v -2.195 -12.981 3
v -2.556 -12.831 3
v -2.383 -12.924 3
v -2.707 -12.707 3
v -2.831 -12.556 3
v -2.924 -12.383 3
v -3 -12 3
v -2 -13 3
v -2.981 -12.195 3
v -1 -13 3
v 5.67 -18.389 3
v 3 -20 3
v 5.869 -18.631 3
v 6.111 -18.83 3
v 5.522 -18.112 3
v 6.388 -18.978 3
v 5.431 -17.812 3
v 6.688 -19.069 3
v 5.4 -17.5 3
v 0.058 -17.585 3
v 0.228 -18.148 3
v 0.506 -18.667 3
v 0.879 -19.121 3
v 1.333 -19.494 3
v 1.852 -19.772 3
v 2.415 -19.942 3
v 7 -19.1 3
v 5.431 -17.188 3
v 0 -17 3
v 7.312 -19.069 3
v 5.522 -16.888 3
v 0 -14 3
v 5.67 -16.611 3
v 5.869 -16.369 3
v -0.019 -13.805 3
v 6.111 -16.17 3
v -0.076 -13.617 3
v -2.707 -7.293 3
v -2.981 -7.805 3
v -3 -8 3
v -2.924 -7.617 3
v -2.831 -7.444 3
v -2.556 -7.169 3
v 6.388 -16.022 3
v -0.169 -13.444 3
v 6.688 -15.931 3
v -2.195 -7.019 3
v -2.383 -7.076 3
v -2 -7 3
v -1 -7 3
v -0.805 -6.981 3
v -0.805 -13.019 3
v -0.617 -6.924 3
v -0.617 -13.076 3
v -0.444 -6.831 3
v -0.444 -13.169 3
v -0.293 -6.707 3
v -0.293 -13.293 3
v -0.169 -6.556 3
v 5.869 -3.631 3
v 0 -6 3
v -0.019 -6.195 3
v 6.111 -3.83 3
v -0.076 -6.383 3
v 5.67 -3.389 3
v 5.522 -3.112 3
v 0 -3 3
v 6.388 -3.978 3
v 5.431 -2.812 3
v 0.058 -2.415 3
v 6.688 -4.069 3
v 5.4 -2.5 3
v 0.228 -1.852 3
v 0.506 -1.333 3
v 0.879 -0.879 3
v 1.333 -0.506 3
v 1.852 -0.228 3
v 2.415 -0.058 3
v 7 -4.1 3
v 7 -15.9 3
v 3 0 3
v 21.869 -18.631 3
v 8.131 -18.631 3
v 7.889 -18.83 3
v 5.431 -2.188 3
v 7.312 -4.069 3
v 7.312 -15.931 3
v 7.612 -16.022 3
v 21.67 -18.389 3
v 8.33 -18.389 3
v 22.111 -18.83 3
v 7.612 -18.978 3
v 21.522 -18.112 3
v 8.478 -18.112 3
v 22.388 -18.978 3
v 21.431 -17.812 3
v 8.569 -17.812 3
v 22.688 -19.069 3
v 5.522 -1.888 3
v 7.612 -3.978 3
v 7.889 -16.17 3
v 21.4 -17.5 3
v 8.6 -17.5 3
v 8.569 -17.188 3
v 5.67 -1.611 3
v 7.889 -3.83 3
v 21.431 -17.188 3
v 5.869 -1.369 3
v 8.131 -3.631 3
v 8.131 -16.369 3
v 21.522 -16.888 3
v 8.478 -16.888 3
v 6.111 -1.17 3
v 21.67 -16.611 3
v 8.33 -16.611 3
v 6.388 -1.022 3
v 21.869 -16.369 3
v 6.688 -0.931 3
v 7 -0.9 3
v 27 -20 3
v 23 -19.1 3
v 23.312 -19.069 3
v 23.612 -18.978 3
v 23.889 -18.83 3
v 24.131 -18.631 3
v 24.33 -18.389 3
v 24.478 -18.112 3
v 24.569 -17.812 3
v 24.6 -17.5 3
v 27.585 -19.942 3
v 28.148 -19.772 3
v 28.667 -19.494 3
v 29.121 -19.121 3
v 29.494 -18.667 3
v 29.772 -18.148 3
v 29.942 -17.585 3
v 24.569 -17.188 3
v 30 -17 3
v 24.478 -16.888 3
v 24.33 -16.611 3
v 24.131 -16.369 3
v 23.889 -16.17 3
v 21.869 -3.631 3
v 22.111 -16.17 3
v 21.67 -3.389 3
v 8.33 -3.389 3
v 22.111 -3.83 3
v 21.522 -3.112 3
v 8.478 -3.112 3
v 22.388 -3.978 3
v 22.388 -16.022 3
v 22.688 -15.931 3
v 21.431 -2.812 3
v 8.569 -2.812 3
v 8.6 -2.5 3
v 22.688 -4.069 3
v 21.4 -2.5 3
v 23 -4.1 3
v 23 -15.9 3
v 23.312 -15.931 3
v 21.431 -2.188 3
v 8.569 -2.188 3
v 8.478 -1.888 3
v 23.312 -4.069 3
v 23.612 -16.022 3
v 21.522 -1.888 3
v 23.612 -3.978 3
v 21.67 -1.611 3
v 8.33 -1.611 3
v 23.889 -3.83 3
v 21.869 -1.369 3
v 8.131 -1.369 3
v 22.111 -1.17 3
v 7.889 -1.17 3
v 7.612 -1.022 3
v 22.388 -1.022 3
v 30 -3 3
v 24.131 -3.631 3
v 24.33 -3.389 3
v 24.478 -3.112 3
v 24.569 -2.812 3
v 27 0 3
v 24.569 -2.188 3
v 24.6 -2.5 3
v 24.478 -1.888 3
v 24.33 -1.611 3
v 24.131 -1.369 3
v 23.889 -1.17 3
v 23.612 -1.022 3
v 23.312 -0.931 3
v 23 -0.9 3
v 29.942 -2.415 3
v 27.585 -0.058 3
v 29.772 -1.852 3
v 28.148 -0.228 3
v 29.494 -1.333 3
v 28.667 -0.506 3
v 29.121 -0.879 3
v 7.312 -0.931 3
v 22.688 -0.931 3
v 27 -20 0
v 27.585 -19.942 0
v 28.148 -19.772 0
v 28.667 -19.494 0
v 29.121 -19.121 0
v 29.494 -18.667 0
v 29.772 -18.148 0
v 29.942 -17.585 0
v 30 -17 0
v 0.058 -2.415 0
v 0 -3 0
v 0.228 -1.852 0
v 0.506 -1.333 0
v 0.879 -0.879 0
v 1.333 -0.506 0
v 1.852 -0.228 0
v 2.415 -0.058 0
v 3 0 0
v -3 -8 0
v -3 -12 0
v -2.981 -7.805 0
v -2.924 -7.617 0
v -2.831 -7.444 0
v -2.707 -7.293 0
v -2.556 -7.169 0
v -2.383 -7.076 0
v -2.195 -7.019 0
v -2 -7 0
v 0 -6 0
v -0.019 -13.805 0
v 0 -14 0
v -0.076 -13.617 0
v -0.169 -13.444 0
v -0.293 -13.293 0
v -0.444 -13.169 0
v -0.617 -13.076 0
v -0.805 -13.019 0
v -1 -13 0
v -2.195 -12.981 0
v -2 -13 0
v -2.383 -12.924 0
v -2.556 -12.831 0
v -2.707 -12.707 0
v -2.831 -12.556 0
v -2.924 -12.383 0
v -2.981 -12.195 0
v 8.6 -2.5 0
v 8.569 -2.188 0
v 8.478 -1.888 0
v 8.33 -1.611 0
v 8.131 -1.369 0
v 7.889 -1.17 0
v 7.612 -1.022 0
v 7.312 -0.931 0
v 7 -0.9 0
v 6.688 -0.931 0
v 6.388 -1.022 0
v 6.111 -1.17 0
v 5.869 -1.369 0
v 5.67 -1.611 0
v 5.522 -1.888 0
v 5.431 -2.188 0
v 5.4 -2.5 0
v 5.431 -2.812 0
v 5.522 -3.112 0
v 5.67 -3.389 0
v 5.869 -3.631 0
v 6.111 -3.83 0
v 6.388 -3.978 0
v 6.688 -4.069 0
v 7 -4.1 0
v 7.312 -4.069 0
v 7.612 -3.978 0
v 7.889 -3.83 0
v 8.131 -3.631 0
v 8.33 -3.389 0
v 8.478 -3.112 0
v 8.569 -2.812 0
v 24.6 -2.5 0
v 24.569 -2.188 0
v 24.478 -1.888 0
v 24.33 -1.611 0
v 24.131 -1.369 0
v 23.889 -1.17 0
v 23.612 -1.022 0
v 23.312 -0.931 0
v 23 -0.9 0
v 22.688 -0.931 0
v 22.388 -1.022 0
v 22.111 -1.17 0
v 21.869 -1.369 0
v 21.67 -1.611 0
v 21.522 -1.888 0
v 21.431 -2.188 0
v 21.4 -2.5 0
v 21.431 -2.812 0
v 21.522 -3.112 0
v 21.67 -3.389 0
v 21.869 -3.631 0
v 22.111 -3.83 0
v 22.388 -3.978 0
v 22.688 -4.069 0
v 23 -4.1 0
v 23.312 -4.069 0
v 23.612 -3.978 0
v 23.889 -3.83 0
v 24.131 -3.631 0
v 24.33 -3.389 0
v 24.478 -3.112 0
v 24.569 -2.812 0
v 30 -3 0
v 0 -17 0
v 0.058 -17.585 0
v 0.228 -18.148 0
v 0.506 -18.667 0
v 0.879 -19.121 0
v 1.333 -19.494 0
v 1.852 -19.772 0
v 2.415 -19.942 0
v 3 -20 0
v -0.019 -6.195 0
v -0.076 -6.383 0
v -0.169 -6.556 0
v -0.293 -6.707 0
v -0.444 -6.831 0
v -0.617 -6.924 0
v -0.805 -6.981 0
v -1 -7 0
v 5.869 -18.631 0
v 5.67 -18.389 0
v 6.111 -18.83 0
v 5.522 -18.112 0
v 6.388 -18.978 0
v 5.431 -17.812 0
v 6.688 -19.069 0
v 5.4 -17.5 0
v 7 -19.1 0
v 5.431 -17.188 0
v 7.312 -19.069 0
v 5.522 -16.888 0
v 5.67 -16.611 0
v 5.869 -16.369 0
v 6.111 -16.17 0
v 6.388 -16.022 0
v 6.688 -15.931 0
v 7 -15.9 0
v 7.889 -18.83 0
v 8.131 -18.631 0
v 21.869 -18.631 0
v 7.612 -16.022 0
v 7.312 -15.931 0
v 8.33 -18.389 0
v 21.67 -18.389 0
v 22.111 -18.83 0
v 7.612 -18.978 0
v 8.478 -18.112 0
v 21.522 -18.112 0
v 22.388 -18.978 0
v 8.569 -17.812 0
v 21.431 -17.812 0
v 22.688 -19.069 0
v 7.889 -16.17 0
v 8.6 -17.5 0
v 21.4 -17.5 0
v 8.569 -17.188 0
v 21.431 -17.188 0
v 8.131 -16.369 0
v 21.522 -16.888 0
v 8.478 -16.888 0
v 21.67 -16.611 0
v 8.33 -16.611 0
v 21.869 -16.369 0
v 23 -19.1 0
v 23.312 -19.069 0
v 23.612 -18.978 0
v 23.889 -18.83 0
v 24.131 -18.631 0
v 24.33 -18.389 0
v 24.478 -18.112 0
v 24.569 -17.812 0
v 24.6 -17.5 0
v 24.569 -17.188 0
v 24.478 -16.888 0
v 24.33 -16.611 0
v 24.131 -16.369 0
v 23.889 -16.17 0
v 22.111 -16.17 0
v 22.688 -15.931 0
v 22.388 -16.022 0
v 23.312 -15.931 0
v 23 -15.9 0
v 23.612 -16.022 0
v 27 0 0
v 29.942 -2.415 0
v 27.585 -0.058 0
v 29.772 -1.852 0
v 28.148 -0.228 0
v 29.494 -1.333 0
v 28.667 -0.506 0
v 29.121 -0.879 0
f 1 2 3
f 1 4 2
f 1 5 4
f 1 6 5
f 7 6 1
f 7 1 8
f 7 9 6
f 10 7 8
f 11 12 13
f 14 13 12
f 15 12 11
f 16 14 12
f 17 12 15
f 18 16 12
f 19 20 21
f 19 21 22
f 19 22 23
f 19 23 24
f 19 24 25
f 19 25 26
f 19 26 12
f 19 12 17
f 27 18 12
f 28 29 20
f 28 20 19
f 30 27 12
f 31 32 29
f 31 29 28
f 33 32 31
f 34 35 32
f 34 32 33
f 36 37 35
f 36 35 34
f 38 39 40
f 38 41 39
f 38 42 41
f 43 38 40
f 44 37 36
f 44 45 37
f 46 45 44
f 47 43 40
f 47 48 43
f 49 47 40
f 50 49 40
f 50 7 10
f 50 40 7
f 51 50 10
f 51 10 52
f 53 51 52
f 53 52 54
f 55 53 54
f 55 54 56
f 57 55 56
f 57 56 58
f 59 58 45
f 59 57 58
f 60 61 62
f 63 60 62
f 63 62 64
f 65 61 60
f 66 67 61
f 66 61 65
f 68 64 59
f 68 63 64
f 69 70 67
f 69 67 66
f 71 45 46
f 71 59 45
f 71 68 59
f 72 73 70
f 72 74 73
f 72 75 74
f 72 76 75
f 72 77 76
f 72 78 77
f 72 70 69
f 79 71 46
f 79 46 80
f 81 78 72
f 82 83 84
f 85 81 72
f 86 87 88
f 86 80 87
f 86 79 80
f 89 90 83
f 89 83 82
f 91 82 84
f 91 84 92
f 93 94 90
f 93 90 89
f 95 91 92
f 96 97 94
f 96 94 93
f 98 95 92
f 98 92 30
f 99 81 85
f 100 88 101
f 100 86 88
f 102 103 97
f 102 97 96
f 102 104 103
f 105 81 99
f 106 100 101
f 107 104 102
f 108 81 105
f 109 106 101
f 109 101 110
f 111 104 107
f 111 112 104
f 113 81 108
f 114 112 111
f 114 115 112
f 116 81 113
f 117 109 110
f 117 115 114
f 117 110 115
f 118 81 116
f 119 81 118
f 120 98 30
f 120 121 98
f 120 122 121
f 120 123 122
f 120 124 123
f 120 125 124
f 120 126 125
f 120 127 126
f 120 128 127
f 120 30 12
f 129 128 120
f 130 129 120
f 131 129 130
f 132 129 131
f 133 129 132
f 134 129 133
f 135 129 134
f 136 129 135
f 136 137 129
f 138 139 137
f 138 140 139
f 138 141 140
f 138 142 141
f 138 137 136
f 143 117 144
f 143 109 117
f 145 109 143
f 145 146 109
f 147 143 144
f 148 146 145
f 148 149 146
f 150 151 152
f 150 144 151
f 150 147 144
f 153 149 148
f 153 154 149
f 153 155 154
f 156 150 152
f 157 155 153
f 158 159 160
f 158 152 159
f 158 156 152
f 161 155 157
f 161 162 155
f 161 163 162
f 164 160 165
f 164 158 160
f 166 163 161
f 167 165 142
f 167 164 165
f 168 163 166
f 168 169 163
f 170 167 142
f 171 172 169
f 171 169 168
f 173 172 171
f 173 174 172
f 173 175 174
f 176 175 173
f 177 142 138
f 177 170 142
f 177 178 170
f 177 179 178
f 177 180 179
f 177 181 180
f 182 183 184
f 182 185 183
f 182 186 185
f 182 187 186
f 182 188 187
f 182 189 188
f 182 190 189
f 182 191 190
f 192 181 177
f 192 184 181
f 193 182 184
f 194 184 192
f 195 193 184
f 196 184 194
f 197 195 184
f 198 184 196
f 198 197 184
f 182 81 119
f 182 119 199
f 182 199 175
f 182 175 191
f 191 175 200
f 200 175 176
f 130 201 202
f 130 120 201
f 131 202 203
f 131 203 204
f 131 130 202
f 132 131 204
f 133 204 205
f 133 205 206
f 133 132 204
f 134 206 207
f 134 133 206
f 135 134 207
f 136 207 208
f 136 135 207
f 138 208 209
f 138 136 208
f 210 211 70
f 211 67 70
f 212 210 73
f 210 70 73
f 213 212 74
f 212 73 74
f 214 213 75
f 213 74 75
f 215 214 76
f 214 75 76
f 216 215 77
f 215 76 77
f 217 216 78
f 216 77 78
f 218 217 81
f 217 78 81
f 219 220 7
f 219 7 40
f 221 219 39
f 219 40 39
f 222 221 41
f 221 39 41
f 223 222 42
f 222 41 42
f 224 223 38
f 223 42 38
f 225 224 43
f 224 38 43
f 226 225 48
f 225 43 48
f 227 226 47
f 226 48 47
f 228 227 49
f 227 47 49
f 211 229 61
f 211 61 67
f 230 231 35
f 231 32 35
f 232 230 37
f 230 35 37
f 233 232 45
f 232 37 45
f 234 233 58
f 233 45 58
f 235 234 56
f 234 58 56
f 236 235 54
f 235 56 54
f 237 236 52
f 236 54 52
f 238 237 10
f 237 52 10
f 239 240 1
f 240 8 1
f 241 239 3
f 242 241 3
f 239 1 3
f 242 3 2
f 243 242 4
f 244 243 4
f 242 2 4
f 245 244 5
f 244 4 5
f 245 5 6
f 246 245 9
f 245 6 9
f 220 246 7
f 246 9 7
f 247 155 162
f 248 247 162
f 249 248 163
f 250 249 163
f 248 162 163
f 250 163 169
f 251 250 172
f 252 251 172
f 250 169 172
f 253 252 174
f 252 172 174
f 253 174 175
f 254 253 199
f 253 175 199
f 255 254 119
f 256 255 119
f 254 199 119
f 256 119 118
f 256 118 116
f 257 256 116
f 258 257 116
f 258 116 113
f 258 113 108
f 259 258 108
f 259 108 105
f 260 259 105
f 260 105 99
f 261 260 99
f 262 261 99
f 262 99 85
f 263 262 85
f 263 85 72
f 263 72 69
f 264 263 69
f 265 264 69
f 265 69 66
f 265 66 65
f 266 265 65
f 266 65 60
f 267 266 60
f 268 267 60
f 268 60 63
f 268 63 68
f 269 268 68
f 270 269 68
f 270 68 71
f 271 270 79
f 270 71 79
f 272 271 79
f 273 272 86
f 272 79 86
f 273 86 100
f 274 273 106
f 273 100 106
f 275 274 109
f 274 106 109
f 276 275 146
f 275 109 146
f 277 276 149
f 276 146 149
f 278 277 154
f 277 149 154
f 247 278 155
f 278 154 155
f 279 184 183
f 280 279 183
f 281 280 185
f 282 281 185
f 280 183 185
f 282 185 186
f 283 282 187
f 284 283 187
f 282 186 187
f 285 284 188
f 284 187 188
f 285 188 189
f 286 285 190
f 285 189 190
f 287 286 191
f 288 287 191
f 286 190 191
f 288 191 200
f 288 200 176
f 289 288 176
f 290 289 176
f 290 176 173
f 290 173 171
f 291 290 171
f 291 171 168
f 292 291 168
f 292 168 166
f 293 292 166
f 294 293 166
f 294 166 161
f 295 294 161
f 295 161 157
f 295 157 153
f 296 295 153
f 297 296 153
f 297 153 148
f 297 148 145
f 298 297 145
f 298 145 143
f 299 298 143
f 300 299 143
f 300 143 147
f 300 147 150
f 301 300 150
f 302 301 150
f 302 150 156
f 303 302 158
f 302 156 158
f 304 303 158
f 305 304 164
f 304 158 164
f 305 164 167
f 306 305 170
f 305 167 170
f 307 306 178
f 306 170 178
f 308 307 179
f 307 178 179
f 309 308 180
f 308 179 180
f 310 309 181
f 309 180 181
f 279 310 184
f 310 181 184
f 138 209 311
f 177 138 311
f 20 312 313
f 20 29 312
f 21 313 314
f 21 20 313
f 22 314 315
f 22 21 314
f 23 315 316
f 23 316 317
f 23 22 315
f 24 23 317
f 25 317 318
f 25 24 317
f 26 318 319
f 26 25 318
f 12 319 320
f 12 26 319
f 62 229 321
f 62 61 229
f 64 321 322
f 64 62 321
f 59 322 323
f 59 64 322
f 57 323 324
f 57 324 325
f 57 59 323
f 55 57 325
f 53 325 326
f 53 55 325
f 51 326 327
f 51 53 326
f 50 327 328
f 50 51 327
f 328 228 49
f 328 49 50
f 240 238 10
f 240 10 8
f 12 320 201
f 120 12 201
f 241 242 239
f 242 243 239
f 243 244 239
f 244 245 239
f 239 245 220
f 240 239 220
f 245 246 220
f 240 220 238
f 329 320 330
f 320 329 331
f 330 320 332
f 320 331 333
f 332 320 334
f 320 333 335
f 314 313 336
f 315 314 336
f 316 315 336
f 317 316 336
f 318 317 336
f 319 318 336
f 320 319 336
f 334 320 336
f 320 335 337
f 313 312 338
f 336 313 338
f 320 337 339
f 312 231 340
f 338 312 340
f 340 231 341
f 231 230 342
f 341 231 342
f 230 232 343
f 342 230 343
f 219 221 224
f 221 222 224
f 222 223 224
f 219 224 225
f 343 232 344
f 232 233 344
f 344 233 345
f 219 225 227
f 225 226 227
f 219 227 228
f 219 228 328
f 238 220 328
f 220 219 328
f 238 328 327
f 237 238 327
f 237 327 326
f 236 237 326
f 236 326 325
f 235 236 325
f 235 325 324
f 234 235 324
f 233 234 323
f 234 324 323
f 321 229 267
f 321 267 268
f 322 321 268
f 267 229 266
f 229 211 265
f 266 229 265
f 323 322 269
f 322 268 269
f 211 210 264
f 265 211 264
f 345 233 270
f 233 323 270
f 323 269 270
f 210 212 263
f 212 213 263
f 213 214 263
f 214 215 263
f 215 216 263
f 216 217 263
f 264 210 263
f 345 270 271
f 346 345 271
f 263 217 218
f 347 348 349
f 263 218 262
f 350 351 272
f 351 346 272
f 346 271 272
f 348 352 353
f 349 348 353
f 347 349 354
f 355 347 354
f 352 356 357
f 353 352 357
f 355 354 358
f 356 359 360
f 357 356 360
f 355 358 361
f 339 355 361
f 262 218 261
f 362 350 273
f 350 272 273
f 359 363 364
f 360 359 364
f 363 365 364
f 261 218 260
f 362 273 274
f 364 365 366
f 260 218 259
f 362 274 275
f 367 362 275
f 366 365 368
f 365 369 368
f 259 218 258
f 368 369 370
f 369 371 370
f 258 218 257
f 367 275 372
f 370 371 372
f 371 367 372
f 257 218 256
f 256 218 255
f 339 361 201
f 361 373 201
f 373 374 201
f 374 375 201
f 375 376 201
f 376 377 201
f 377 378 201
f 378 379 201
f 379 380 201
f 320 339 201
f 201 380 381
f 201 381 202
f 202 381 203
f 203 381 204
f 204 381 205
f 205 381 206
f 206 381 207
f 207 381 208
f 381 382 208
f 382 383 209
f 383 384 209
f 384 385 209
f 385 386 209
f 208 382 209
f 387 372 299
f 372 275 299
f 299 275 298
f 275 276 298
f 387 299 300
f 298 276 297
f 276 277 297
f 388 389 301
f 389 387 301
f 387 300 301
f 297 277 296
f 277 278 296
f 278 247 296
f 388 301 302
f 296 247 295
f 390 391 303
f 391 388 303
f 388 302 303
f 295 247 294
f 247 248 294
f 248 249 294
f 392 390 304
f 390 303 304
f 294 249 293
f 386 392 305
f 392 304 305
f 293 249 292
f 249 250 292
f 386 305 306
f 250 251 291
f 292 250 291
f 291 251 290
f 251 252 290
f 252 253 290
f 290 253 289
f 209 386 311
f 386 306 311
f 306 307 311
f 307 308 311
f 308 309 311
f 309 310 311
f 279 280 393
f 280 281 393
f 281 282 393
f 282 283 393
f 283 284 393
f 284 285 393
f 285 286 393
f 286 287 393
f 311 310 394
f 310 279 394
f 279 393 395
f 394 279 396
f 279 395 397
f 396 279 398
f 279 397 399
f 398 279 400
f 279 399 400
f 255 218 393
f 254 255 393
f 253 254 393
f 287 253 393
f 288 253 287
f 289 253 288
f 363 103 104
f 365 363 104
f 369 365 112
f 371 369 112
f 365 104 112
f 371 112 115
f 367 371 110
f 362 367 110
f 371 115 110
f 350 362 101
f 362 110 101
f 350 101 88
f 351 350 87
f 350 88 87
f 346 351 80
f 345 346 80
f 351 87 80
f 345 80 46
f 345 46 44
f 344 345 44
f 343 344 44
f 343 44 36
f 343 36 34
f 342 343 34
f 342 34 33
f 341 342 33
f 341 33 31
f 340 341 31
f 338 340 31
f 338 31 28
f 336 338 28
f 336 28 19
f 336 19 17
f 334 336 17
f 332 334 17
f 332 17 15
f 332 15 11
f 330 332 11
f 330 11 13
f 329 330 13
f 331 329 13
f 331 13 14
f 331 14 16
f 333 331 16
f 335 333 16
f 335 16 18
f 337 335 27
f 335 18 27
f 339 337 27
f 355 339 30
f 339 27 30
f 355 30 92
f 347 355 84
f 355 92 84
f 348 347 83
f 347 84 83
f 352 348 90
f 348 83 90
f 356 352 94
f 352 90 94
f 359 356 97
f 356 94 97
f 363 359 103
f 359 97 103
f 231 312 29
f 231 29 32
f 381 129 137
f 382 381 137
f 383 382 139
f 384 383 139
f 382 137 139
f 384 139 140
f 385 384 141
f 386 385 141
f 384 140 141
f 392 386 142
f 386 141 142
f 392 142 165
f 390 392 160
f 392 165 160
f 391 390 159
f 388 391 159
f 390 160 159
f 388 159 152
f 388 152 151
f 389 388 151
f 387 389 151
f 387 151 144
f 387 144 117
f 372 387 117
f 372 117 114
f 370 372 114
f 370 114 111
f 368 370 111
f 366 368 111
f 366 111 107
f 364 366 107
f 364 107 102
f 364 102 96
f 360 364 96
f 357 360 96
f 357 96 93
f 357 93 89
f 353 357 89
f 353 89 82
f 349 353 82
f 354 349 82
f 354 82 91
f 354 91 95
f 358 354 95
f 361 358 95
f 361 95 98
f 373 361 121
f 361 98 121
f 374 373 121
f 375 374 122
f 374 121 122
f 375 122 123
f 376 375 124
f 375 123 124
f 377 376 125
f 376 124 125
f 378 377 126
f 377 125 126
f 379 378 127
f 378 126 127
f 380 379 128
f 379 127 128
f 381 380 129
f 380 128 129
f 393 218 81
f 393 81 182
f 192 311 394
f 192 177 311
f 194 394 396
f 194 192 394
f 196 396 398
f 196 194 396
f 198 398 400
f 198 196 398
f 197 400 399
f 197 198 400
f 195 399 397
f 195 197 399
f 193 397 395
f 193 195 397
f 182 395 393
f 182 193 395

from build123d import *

# Parameters (mm, degrees)
SKETCH_2_W          = 30
SKETCH_2_H          = 20
EXTRUDE_1_DEPTH     = 3
FILLET_1_R          = 3
SKETCH_3_R          = 1.6
CUT_EXTRUDE_1_DEPTH = 4
EXTRUDE_2_DEPTH     = 3
FILLET_2_R          = 1


with BuildPart() as part:
    # 草图2 → 凸台-拉伸1 (new body)
    with BuildSketch(Plane.XY):
        with Locations((15, -10)):
            Rectangle(SKETCH_2_W, SKETCH_2_H)
    extrude(amount=EXTRUDE_1_DEPTH)

    # 圆角1
    fillet_1_edges = [part.edges().sort_by_distance(p)[0] for p in [
        (0, 0, 1.5),
        (30, 0, 1.5),
        (30, -20, 1.5),
        (0, -20, 1.5),
    ]]
    fillet(fillet_1_edges, radius=FILLET_1_R)

    # 草图3 → 切除-拉伸1 (cut, through all)
    with BuildSketch(Plane.XY.offset(3)):
        with Locations((23, -2.5)):
            Circle(SKETCH_3_R)
        with Locations((23, -17.5)):
            Circle(SKETCH_3_R)
        with Locations((7, -17.5)):
            Circle(SKETCH_3_R)
        with Locations((7, -2.5)):
            Circle(SKETCH_3_R)
    extrude(amount=-CUT_EXTRUDE_1_DEPTH, mode=Mode.SUBTRACT)

    # 草图4 → 凸台-拉伸2 (add)
    with BuildSketch(Plane(origin=(0, 0, 0), x_dir=(-1, 0, 0), z_dir=(0, 0, -1))):
        Polygon((0, -10), (0, -13), (3, -13), (3, -7), (0, -7), align=None)
    extrude(amount=-EXTRUDE_2_DEPTH)

    # 圆角2
    fillet_2_edges = [part.edges().sort_by_distance(p)[0] for p in [
        (0, -7, 1.5),
        (-3, -7, 1.5),
        (-3, -13, 1.5),
        (0, -13, 1.5),
    ]]
    fillet(fillet_2_edges, radius=FILLET_2_R)


solid = part.part
